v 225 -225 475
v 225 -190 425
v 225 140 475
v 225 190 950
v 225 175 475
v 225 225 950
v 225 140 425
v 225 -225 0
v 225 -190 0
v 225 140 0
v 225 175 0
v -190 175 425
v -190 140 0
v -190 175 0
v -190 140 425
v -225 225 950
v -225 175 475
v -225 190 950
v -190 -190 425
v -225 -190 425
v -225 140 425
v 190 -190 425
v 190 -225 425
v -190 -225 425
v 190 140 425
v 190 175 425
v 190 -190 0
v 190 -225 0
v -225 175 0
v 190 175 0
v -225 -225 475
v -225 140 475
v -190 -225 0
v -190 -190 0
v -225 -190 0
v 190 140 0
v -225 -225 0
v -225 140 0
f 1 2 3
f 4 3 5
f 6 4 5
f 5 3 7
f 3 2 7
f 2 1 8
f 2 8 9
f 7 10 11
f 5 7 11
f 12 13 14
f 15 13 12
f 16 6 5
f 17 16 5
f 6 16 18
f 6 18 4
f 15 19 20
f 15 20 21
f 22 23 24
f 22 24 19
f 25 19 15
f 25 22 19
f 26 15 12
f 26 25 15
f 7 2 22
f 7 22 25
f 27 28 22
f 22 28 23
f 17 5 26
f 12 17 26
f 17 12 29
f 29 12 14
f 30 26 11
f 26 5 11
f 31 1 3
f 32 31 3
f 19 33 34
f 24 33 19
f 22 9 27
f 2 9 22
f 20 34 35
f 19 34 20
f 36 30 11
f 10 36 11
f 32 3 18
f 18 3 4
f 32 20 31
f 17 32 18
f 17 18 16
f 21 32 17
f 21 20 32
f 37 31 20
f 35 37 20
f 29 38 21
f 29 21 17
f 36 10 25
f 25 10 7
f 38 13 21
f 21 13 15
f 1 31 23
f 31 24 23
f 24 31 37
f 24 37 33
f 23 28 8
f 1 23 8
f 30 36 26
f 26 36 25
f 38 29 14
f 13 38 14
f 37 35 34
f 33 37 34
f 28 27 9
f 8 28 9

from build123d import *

# Parameters (mm, degrees)
F0_W     = 450
F0_H     = 450
F1_DEPTH = 950
F2_W     = 50
F2_H     = 50
F2_W_2   = 330
F2_H_2   = 425
F3_DEPTH = 450.001
F4_W     = 380
F4_H     = 425
F5_DEPTH = 450.001


with BuildPart() as f1:
    # F0 (on Top) → F1 (new body)
    with BuildSketch(Plane.XY):
        Rectangle(F0_W, F0_H)
    extrude(amount=F1_DEPTH)

    # F2 (on face) → F3 (cut, through all)
    with BuildSketch(Plane.YZ.offset(225)):
        with Locations((200, 450)):
            Rectangle(F2_W, F2_H)
        Polygon((-225, 950), (-225, 475), (140, 475), (190, 950), align=None)
        Polygon((225, 950), (175, 475), (225, 475), align=None)
        with Locations((-25, 212.5)):
            Rectangle(F2_W_2, F2_H_2)
        with Locations((200, 212.5)):
            Rectangle(F2_W, F2_H_2)
    extrude(amount=-F3_DEPTH, mode=Mode.SUBTRACT)

    # F4 (on face) → F5 (cut, through all)
    with BuildSketch(Plane.XZ.offset(225)):
        with Locations((0, 212.5)):
            Rectangle(F4_W, F4_H)
    extrude(amount=-F5_DEPTH, mode=Mode.SUBTRACT)


solid = f1.part
